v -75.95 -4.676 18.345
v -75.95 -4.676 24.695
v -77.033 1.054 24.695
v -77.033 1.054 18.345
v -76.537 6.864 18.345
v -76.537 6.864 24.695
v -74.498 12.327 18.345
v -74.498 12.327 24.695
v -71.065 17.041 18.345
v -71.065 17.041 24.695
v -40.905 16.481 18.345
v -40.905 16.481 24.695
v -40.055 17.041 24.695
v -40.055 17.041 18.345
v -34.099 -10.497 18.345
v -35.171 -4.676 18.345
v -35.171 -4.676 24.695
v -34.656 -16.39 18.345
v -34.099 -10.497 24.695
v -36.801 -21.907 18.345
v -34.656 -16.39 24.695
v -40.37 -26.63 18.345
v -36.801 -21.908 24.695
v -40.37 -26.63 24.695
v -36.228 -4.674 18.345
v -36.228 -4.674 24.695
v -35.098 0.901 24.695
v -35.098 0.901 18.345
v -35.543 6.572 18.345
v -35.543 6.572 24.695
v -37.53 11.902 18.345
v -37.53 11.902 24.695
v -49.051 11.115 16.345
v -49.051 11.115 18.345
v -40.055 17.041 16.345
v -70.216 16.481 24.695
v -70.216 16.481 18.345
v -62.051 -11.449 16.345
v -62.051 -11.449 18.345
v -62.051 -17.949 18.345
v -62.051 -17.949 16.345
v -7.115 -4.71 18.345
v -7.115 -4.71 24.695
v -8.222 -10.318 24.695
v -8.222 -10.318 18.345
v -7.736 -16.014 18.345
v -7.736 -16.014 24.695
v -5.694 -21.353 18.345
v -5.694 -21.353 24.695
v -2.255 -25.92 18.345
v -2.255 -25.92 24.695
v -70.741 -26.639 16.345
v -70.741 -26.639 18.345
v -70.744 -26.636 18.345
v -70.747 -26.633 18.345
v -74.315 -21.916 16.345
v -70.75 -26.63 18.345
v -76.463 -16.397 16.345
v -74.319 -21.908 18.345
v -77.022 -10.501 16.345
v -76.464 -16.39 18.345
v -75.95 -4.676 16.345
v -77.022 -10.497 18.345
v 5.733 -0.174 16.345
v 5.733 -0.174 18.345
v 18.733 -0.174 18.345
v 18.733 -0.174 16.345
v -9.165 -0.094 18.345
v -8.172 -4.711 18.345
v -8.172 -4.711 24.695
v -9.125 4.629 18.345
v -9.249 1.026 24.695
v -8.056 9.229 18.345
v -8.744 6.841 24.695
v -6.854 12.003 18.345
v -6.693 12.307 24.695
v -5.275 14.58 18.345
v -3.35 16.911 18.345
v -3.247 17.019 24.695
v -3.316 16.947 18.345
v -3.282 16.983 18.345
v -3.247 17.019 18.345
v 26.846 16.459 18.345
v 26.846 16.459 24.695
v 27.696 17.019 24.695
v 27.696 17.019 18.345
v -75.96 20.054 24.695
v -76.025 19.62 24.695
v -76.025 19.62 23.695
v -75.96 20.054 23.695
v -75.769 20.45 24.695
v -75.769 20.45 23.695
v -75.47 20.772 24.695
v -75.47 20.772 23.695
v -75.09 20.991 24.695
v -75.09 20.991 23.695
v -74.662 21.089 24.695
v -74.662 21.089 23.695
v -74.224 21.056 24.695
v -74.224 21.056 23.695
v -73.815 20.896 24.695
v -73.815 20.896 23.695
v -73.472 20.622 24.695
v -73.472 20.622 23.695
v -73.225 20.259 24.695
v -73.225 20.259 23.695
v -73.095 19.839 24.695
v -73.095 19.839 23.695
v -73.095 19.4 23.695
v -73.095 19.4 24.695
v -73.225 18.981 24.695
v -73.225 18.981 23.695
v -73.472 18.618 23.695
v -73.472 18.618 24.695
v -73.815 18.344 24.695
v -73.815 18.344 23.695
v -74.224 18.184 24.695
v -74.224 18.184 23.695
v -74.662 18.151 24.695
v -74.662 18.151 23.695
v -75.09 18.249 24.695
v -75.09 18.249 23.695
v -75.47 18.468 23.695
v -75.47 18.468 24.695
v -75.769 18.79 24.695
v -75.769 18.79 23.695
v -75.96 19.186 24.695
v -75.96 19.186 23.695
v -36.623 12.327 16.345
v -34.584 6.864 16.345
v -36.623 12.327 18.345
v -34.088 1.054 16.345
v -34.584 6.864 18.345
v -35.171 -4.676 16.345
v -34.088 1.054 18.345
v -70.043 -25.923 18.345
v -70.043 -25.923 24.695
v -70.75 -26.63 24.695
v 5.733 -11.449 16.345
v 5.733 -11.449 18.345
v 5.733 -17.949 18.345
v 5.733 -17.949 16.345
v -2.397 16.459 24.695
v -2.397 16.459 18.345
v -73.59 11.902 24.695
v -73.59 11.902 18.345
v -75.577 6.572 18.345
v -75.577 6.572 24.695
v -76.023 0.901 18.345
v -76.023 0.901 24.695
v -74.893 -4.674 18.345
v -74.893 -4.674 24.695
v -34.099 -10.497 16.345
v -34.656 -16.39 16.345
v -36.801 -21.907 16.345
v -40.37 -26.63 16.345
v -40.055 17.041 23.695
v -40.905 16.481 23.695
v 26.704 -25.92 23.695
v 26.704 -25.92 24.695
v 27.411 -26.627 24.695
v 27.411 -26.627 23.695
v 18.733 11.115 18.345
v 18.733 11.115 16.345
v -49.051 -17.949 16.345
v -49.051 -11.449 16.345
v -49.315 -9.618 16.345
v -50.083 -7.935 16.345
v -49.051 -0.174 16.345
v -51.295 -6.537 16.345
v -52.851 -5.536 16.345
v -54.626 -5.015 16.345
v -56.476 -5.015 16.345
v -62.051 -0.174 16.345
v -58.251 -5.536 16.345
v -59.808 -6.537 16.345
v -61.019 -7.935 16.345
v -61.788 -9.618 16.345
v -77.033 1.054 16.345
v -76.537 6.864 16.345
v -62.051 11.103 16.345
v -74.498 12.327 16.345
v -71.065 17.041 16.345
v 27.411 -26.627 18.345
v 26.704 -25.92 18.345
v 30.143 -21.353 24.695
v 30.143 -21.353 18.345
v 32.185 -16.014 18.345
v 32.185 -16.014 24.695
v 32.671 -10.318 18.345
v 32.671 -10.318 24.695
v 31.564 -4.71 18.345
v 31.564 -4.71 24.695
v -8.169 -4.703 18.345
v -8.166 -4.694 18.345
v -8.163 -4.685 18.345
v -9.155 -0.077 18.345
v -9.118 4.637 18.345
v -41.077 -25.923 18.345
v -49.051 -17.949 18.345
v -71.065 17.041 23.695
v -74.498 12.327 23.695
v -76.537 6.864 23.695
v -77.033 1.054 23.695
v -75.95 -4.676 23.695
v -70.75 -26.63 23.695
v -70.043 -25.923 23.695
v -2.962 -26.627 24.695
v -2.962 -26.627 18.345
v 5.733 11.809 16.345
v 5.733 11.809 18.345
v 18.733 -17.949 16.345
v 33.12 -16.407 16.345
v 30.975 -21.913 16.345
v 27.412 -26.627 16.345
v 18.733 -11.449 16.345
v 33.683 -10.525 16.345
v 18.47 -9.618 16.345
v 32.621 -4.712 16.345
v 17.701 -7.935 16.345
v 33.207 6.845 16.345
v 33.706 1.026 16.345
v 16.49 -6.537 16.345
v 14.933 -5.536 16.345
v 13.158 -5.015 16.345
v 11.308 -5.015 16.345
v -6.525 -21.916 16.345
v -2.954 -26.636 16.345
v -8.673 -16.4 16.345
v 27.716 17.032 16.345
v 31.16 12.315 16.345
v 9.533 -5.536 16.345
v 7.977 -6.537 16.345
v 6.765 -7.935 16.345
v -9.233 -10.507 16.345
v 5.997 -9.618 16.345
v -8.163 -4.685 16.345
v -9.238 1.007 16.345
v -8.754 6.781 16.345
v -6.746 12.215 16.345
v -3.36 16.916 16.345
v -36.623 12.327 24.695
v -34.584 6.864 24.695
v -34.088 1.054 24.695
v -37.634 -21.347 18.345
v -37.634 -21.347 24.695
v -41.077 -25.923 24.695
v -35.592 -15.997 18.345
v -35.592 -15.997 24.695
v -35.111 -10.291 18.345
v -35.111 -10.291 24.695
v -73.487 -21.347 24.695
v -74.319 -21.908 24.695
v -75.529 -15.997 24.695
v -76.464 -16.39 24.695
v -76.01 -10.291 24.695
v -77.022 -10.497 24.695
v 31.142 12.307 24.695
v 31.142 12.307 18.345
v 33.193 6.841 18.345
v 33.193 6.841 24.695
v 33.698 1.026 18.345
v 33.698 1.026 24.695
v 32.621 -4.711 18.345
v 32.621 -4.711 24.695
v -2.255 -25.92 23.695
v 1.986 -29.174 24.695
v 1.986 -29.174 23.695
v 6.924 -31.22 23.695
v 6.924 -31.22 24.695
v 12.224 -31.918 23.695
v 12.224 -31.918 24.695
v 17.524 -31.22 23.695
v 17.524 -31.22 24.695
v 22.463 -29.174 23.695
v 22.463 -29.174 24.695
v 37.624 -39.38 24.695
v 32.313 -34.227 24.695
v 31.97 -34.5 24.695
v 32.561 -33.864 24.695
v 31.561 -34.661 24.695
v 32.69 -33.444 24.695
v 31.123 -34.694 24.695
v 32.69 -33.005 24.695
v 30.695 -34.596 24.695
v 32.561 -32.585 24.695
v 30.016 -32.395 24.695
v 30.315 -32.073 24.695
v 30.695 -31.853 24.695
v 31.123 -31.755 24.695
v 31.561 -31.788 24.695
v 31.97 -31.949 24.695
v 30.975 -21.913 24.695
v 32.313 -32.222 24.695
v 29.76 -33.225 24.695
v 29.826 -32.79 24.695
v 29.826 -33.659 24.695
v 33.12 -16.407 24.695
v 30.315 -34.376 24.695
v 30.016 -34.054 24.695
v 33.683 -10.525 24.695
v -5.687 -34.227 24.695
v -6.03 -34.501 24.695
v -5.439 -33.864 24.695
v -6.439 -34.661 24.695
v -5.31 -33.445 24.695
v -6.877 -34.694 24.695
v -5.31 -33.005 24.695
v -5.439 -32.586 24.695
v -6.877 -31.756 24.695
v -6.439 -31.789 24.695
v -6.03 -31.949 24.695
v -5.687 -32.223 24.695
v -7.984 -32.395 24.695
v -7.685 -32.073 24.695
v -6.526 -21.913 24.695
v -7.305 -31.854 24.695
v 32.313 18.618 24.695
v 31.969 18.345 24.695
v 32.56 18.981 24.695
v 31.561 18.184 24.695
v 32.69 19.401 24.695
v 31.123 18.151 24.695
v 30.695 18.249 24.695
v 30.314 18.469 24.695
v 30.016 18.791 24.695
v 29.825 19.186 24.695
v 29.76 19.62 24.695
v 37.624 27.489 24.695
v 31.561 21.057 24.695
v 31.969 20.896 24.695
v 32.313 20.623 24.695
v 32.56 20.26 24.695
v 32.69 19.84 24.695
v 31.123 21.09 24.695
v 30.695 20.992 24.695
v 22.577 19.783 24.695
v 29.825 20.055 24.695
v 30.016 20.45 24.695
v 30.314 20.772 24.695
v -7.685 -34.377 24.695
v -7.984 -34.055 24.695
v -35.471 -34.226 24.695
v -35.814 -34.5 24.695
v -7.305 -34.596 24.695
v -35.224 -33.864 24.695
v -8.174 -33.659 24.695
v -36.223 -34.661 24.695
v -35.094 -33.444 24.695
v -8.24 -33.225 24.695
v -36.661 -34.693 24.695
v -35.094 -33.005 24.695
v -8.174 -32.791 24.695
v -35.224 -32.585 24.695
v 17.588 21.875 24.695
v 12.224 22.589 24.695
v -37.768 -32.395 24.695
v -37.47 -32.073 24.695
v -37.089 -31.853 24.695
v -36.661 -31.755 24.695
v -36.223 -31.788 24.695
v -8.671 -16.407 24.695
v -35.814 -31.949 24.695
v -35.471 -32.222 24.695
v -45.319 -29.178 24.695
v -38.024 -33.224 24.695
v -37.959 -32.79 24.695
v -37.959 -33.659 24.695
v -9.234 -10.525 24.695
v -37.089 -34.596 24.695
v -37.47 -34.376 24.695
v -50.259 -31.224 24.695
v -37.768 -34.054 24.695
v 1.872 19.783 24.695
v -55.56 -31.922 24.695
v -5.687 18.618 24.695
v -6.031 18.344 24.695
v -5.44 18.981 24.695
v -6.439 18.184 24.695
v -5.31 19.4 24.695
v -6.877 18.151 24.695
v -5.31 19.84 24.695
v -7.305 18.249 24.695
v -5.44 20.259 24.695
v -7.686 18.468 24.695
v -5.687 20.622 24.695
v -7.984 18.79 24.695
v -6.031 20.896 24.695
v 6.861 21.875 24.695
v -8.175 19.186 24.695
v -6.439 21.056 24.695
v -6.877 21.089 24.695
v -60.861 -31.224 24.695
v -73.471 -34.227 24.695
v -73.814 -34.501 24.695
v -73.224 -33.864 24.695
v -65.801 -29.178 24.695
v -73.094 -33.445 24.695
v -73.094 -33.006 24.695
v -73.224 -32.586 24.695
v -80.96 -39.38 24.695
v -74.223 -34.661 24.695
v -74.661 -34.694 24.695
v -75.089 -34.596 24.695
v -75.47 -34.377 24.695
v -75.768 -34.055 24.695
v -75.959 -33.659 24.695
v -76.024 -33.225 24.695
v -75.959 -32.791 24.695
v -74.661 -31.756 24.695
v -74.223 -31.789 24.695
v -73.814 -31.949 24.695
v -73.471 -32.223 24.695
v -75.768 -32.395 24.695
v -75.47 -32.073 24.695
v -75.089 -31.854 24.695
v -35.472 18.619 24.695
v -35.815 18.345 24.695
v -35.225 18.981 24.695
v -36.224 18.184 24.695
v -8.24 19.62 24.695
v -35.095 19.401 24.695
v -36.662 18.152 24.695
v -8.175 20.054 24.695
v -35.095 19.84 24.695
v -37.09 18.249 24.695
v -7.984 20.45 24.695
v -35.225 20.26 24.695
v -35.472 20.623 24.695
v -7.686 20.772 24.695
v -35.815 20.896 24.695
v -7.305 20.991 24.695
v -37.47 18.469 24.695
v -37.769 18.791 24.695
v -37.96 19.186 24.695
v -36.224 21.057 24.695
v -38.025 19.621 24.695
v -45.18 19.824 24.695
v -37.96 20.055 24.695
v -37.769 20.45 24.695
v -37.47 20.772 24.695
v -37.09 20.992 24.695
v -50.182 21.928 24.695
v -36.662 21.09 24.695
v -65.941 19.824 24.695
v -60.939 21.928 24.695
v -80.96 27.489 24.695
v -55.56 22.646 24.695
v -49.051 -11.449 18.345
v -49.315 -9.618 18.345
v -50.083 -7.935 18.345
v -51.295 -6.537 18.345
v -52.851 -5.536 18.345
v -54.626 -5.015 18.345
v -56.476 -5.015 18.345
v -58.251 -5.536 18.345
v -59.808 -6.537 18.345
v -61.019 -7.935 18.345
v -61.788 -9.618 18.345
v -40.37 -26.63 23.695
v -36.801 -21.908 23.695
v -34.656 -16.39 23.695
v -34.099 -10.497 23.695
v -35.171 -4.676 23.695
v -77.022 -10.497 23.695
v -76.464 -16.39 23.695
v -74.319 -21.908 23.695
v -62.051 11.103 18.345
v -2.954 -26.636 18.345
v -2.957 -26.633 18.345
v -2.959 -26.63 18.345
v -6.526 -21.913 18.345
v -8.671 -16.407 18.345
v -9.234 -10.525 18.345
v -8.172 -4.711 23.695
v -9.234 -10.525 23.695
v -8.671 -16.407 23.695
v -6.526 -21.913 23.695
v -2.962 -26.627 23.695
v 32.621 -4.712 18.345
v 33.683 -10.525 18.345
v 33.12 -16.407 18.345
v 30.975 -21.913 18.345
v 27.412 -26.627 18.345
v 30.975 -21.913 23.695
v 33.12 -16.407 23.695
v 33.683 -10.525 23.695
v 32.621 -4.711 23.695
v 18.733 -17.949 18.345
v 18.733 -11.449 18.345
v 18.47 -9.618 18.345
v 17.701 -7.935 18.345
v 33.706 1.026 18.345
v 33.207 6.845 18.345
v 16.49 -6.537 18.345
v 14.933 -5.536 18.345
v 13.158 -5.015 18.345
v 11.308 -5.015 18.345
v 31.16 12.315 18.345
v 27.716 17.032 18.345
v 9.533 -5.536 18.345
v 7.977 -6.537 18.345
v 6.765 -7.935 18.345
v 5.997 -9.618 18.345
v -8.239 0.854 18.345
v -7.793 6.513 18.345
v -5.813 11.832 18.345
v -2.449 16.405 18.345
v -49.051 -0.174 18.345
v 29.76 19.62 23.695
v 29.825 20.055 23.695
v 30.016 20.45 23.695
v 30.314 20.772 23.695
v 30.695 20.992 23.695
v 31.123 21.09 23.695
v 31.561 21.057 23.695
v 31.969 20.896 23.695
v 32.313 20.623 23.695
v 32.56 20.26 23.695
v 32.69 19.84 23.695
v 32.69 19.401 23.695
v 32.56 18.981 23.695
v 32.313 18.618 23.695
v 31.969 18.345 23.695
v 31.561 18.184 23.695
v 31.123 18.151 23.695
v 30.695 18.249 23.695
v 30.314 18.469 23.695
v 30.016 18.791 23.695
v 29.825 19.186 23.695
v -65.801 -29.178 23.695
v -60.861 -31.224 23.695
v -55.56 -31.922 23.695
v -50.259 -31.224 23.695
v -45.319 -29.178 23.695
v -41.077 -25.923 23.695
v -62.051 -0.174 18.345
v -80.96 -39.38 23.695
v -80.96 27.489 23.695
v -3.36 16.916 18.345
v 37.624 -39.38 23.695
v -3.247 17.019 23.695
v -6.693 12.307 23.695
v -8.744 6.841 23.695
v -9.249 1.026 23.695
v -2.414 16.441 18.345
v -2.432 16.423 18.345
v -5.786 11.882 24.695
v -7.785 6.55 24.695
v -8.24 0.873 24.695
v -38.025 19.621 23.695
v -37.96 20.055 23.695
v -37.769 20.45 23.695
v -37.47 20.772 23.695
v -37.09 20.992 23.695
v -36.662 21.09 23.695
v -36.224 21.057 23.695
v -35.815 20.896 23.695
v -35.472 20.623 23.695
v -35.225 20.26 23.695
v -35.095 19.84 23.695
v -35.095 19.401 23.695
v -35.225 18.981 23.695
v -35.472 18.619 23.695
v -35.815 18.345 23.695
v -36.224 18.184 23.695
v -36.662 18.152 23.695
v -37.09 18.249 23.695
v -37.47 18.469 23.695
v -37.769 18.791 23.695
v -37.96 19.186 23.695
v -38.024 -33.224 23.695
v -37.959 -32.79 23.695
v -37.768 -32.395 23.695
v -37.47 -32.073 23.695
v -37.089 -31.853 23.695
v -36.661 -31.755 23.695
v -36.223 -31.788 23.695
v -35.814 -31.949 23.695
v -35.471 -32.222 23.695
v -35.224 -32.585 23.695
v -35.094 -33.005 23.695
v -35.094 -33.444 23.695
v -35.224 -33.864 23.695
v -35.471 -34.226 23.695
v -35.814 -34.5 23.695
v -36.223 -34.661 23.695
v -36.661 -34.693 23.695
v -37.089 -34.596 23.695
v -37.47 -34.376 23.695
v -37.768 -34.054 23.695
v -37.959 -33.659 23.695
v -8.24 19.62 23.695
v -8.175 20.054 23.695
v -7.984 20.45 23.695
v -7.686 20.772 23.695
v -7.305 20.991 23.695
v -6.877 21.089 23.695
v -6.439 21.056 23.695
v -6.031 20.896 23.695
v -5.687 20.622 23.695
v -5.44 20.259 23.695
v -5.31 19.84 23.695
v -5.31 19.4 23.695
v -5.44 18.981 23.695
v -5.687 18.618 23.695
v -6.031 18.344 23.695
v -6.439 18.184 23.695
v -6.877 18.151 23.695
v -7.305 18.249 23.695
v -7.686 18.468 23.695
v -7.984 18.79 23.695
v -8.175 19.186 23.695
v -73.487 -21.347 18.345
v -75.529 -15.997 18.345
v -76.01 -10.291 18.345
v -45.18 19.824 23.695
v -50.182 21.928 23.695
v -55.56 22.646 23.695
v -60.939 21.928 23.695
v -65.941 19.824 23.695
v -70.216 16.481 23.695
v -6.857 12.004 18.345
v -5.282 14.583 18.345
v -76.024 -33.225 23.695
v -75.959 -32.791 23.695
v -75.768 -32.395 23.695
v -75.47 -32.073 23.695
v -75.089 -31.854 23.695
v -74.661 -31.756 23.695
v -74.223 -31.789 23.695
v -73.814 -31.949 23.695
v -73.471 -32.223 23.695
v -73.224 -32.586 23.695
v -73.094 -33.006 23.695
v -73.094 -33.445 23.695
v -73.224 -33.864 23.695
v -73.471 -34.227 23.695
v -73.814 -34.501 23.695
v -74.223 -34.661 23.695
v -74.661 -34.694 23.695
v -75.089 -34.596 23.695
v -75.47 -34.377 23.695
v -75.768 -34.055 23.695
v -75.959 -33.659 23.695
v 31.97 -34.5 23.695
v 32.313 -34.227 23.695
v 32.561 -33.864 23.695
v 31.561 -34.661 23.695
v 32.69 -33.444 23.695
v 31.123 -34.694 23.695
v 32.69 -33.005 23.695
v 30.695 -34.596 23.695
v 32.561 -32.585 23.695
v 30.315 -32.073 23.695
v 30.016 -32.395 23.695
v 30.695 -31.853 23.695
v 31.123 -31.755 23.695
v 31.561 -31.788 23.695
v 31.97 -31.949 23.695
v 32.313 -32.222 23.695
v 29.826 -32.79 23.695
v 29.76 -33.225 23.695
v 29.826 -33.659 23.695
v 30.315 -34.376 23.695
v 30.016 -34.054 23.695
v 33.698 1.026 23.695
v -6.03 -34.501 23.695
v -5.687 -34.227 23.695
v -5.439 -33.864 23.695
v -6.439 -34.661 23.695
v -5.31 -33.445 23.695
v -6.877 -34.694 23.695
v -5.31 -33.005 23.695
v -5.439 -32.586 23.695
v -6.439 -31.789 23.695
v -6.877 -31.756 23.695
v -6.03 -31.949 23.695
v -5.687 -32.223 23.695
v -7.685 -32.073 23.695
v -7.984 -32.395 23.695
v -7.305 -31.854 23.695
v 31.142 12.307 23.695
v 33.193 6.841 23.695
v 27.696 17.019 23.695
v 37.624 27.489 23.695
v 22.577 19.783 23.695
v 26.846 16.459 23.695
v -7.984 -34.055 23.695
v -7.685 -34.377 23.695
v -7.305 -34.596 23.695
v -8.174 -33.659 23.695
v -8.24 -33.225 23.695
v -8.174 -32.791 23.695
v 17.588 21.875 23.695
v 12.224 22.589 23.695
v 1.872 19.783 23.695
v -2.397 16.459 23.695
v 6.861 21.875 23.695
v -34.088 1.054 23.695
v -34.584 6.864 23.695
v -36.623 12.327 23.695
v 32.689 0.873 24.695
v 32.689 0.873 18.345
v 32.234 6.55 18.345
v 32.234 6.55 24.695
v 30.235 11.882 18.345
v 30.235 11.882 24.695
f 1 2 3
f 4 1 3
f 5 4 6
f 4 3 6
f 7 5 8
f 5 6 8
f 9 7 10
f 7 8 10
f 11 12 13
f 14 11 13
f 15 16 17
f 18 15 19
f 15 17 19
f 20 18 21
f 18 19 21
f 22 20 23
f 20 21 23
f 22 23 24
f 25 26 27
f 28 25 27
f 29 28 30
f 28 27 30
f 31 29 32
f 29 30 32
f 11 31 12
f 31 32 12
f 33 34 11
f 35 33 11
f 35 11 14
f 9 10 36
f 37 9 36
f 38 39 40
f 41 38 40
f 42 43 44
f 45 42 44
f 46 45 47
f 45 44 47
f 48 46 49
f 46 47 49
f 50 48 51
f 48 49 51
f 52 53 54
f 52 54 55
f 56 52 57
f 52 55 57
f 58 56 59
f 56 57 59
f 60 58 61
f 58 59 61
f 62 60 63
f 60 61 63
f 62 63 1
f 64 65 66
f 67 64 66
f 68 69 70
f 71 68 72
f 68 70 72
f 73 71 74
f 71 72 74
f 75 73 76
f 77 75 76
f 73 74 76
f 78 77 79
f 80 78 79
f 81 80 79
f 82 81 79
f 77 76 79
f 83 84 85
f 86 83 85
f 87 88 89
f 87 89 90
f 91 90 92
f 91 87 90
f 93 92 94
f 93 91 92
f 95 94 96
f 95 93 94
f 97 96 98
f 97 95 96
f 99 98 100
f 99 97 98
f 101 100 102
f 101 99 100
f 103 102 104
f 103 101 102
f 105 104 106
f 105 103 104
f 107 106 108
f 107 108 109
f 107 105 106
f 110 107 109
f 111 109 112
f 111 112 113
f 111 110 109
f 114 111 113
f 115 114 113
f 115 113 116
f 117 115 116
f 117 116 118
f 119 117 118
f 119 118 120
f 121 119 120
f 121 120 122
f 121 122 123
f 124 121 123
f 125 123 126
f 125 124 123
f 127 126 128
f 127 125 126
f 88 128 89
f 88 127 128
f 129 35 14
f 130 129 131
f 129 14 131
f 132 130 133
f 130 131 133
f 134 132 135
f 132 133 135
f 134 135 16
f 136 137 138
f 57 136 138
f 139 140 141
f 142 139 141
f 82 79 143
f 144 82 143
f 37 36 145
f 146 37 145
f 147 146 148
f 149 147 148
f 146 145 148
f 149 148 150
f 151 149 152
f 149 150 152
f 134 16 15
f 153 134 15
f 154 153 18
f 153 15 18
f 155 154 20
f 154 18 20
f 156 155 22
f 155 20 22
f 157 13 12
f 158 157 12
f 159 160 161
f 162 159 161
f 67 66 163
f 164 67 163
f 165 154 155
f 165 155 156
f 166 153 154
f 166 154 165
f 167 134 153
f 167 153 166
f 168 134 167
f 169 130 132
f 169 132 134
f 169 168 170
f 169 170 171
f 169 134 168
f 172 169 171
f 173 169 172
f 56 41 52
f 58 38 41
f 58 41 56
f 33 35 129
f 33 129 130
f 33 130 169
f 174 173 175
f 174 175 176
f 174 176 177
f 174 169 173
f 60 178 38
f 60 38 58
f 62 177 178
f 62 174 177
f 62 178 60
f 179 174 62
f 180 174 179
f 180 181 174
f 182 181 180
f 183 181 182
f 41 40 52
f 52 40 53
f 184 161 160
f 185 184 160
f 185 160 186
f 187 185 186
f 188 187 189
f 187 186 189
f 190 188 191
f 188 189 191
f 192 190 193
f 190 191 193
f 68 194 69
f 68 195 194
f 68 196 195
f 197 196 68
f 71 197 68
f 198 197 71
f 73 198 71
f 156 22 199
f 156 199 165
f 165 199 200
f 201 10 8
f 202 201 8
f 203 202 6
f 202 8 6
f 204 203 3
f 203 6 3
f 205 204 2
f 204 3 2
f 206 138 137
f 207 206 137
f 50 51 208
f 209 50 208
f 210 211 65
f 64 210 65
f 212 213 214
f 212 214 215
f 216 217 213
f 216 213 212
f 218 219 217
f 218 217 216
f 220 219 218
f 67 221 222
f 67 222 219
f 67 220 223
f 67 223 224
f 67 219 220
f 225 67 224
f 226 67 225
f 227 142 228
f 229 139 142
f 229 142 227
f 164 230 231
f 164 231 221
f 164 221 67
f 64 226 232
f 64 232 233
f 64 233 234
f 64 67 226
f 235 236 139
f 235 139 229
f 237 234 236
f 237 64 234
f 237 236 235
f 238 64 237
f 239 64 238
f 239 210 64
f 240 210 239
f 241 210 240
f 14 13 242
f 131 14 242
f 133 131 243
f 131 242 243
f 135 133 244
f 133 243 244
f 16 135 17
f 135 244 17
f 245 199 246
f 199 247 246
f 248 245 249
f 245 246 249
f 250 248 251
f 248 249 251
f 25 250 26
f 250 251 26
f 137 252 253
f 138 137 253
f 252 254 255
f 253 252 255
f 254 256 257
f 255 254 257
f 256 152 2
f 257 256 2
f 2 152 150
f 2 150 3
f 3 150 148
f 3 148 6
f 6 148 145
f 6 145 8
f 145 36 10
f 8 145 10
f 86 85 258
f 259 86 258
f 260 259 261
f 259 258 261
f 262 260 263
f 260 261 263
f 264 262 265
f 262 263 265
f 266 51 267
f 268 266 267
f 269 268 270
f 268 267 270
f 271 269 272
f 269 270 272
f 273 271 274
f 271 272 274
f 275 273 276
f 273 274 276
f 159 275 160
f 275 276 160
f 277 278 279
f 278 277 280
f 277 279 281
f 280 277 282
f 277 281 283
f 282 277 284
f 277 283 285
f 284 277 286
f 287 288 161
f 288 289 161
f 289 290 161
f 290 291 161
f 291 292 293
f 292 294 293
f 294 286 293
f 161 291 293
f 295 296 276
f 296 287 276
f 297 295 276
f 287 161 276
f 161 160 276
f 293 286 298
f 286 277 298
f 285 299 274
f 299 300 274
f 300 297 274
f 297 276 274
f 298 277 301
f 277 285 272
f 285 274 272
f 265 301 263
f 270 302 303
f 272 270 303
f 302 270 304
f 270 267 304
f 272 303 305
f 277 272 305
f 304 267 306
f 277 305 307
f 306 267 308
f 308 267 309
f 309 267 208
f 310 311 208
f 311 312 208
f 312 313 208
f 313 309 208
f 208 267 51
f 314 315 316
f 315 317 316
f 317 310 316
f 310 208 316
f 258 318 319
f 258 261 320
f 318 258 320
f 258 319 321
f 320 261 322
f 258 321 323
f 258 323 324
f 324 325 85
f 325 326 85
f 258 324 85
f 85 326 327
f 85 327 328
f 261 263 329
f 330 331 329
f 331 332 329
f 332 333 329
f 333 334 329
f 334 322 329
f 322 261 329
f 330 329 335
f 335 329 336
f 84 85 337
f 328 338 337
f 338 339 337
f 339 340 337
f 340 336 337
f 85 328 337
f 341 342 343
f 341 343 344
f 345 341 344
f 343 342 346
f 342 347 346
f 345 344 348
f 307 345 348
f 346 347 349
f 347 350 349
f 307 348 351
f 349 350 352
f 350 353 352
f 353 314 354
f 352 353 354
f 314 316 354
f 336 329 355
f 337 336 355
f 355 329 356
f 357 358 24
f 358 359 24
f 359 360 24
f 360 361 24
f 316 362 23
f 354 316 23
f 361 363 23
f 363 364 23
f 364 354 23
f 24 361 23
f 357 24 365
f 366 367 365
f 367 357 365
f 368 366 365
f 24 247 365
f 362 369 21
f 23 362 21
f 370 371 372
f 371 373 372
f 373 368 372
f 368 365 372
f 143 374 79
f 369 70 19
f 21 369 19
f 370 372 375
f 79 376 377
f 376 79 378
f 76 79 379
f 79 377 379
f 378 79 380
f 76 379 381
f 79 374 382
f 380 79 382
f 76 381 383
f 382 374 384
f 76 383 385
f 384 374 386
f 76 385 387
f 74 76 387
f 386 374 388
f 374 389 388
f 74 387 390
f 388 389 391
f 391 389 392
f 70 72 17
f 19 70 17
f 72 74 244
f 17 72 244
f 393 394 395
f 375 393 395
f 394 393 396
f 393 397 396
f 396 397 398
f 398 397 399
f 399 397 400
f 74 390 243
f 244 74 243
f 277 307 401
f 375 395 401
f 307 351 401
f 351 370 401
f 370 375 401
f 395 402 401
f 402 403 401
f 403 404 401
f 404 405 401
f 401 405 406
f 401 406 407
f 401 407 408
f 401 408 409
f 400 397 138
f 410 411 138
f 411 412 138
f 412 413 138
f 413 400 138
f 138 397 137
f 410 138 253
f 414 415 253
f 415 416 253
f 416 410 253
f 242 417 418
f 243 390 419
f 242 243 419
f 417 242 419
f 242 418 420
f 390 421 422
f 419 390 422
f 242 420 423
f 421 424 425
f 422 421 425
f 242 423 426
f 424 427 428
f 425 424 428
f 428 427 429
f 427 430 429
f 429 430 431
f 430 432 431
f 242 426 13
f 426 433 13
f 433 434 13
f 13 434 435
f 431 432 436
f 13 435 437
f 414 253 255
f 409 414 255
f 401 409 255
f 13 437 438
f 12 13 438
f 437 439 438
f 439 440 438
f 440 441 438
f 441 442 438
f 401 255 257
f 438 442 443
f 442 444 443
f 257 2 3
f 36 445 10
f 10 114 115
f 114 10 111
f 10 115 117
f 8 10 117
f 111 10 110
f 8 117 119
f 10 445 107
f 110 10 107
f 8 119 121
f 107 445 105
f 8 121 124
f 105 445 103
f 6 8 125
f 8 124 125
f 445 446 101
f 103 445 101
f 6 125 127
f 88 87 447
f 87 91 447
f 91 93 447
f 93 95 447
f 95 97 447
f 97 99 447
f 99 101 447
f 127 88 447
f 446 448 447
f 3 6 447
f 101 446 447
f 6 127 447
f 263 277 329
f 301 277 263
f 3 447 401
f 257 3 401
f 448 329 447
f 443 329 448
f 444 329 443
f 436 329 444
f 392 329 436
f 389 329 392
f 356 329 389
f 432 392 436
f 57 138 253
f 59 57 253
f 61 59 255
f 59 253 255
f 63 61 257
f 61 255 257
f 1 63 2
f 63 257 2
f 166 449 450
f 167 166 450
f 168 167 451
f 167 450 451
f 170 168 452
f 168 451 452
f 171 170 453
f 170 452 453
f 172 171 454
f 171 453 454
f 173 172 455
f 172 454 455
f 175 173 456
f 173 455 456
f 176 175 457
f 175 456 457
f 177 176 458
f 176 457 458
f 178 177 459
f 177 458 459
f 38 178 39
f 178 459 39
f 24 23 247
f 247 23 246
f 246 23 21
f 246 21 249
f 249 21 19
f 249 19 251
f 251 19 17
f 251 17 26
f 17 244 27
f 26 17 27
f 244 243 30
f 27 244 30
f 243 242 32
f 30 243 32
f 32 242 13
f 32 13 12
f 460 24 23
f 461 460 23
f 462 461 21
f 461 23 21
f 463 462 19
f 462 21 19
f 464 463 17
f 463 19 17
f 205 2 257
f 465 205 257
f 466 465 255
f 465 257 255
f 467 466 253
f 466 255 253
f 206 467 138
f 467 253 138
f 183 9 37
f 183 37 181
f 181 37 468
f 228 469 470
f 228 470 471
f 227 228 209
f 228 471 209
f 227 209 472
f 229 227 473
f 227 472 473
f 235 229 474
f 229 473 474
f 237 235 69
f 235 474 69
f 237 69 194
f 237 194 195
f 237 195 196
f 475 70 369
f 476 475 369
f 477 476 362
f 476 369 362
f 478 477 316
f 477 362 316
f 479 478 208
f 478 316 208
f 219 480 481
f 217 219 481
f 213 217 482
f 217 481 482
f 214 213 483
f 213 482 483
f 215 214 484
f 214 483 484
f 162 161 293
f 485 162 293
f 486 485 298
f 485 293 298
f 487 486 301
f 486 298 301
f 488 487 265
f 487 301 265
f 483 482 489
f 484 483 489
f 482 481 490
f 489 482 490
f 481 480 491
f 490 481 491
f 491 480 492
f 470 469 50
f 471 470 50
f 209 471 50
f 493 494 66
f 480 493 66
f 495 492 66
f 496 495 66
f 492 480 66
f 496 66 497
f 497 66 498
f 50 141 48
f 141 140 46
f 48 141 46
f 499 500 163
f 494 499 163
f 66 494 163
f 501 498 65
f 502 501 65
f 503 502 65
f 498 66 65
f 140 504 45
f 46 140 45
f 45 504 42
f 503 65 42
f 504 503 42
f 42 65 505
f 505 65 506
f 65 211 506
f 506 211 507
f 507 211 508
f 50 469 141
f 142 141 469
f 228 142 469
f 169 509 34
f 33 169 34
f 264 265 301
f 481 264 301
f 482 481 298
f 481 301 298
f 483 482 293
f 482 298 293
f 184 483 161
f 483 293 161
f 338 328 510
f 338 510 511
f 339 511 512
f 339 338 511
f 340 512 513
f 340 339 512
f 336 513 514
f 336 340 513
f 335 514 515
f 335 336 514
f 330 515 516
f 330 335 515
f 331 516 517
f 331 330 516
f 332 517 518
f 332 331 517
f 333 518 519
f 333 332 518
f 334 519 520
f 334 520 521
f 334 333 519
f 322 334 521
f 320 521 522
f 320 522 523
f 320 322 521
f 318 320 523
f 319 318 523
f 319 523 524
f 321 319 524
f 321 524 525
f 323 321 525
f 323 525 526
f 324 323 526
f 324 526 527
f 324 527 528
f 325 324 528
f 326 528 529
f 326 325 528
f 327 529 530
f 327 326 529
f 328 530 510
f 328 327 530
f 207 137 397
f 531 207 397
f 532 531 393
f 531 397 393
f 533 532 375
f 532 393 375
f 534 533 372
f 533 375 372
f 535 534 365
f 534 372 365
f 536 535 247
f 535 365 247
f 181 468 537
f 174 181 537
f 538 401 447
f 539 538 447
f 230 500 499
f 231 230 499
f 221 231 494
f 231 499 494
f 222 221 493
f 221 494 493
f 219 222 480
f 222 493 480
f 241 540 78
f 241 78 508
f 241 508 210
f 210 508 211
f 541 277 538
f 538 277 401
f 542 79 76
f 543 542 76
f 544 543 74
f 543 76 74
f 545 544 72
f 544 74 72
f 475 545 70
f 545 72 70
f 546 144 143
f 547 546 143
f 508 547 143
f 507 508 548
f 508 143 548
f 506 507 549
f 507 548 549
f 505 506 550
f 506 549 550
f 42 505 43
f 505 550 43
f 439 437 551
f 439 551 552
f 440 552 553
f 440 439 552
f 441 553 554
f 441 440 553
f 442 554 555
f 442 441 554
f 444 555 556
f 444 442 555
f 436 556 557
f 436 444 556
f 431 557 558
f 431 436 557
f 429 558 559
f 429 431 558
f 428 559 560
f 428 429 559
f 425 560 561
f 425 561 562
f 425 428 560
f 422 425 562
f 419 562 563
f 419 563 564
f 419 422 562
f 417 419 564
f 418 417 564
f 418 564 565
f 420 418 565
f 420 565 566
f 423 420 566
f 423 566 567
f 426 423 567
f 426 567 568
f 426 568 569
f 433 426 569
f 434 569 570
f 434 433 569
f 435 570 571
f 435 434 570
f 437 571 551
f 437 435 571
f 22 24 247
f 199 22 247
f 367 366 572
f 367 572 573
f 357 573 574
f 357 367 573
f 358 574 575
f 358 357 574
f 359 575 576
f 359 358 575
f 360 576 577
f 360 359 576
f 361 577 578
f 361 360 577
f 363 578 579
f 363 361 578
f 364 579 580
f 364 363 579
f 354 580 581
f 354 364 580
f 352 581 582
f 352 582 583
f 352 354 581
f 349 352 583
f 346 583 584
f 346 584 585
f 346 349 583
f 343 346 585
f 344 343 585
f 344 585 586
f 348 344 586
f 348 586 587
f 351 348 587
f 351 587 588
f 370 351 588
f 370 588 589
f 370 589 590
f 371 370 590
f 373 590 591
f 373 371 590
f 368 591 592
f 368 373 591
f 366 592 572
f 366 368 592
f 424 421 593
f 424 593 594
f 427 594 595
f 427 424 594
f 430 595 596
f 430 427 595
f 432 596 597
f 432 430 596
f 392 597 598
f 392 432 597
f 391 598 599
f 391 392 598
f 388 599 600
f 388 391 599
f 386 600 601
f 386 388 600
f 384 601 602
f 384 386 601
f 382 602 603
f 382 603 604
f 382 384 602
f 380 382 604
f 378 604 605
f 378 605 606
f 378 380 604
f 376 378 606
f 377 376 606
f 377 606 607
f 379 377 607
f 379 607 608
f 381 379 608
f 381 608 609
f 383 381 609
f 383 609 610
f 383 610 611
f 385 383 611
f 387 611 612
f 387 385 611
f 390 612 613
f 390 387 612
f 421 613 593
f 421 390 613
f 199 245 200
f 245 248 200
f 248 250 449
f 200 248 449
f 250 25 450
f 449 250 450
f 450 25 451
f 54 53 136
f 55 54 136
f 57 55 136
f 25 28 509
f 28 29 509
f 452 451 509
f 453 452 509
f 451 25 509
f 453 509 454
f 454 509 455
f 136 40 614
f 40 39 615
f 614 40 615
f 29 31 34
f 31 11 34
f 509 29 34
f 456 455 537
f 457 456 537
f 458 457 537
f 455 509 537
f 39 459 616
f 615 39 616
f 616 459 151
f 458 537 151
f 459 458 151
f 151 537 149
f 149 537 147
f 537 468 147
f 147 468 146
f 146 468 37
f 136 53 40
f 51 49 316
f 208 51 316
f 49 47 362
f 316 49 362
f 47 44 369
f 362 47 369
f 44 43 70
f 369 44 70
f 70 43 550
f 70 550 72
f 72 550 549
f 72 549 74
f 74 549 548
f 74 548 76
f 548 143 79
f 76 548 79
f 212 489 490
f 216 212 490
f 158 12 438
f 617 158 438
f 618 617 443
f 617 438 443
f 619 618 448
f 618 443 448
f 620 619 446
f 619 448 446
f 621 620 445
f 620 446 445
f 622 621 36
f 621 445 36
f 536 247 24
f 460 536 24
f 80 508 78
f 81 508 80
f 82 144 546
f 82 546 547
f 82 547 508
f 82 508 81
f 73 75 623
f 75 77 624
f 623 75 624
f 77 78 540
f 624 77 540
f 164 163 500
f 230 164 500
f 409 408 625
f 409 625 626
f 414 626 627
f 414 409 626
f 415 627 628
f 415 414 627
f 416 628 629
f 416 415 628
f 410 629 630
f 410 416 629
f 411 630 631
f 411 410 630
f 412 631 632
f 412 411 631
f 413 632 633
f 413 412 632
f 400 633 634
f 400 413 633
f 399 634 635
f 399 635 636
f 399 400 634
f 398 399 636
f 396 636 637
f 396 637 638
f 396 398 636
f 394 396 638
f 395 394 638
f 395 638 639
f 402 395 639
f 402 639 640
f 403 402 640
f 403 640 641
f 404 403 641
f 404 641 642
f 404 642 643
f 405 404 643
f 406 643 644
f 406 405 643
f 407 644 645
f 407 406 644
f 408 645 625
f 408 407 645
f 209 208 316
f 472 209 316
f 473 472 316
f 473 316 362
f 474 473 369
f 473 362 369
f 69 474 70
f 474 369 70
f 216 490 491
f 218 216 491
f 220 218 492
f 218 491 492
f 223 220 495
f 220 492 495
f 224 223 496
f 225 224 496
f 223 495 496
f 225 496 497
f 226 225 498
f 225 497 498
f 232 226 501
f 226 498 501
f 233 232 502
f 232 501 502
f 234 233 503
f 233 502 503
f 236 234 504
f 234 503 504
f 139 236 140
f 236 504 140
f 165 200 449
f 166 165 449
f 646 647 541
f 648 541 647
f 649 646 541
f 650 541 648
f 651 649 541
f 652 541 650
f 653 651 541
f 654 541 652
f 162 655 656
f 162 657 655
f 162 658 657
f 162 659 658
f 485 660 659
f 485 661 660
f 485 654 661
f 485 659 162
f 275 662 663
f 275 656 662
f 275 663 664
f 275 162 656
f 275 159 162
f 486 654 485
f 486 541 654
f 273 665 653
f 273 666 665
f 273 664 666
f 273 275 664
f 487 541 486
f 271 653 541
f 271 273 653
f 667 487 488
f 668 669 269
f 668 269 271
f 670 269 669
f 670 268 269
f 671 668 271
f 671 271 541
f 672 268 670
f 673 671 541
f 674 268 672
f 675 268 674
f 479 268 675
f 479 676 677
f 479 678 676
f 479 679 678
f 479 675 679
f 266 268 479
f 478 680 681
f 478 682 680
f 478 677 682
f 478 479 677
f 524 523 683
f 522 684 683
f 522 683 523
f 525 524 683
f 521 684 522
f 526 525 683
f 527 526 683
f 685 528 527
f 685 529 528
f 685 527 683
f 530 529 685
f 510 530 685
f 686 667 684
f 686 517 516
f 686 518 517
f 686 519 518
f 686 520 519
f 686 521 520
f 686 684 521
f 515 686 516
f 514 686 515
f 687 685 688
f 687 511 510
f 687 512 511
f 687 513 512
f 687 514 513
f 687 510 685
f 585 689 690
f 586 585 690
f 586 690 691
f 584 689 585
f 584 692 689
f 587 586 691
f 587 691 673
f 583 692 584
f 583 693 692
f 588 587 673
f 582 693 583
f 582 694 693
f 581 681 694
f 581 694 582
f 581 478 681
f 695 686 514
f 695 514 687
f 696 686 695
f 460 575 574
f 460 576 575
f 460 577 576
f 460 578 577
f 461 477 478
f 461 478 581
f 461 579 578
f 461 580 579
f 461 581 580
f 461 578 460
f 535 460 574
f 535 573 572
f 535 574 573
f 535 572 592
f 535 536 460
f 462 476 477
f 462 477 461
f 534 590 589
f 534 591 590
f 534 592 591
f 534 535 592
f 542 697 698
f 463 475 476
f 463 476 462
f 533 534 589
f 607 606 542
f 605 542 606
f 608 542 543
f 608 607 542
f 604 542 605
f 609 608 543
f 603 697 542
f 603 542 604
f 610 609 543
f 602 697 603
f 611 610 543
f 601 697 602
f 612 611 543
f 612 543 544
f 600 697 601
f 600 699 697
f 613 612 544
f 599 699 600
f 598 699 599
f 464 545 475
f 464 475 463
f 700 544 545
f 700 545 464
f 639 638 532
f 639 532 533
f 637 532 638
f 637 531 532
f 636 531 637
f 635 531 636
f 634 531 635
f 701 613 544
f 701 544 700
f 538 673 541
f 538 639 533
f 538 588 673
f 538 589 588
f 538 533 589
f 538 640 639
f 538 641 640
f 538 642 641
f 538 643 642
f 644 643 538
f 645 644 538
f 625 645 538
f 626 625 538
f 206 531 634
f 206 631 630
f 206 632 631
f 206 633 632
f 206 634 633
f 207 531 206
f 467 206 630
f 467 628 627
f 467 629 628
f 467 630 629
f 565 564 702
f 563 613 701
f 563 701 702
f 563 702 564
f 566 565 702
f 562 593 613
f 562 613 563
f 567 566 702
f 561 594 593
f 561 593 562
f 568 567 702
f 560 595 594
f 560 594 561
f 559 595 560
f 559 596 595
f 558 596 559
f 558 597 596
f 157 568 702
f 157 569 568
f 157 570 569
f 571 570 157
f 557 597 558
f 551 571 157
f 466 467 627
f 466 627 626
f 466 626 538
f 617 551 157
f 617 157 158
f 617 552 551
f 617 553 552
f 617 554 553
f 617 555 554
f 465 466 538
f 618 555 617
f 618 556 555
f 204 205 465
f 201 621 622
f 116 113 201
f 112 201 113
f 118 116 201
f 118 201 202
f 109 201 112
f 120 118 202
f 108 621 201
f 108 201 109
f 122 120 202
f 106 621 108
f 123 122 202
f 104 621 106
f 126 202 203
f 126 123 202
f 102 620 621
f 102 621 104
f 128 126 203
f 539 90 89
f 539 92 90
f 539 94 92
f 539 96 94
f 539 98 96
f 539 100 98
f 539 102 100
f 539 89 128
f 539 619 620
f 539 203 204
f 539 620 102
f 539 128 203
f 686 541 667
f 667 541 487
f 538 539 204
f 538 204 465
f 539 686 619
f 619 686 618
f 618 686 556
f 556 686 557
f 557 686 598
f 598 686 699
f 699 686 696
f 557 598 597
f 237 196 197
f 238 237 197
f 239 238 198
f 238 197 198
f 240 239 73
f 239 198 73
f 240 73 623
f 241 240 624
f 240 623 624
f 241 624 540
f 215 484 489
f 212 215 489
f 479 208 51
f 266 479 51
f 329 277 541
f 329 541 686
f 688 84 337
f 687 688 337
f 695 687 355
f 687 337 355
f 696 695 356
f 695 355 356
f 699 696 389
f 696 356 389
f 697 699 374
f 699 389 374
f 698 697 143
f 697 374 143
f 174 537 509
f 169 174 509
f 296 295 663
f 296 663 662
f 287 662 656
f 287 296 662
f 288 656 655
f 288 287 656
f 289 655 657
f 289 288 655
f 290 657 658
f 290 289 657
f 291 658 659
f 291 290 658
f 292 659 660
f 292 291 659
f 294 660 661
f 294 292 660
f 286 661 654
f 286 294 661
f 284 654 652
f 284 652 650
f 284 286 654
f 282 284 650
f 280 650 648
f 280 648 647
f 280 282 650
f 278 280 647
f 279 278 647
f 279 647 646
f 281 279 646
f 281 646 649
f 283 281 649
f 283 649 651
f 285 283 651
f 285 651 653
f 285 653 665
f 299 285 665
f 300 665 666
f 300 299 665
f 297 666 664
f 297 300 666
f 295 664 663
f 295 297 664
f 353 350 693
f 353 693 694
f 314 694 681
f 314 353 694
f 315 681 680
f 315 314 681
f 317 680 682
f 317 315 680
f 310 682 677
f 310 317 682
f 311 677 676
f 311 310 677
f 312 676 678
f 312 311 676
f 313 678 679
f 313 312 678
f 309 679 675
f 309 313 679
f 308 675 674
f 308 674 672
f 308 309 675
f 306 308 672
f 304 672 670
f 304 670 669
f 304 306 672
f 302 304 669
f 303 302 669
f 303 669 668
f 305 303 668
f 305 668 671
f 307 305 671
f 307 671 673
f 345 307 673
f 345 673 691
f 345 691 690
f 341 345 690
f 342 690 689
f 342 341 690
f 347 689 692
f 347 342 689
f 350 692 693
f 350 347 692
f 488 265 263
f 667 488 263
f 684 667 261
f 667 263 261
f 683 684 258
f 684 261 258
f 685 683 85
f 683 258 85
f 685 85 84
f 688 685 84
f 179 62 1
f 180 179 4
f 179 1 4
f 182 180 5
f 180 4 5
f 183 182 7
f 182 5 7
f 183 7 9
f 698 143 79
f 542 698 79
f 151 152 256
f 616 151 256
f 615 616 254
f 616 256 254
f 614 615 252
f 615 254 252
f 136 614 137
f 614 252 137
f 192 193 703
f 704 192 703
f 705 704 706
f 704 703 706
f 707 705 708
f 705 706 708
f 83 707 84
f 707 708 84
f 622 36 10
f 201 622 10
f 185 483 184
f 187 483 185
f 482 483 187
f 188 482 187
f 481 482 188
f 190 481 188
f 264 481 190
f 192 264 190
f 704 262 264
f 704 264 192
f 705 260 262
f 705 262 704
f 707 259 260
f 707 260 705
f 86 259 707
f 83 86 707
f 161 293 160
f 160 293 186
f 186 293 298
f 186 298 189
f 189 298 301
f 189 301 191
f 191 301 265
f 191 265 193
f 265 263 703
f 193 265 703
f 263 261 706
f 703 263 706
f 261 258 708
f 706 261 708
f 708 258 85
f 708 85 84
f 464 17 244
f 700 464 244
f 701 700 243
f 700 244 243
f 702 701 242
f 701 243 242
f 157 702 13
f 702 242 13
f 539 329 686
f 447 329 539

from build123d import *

# Parameters (mm, degrees)
BOSS_EXTRUDE1_DEPTH   = 6.35
BOSS_EXTRUDE1_2_DEPTH = 6.35
BOSS_EXTRUDE1_3_DEPTH = 6.35
BOSS_EXTRUDE1_4_DEPTH = 6.35
SKETCH1_5_W           = 118.584765391
SKETCH1_5_H           = 66.869276247
SKETCH1_5_R           = 1.4732
BOSS_EXTRUDE7_DEPTH   = 1
BOSS_EXTRUDE8_DEPTH   = 2


with BuildPart() as part:
    # Sketch1 → Boss-Extrude1 (new body)
    with BuildSketch(Plane(origin=(0, 0, 24.694917193), x_dir=(-1, 0, 0), z_dir=(0, 0, -1))):
        with BuildLine():
            Line((-27.411403448, -26.627000625), (-26.704296667, -25.919893844))
            ThreePointArc((-26.704296667, -25.919893844), (-32.184721764, -16.013806308), (-31.564428782, -4.709786398))
            ThreePointArc((-31.564428782, -4.709786398), (-32.233619939, 6.549502204), (-26.845726601, 16.458589045))
            Line((-26.845726601, 16.458589045), (-27.696075992, 17.018714539))
            ThreePointArc((-27.696075992, 17.018714539), (-33.192970324, 6.841344605), (-32.620835017, -4.711463161))
            ThreePointArc((-32.620835017, -4.711463161), (-33.119816188, -16.406995999), (-27.411403448, -26.627000625))
        make_face()
    extrude(amount=BOSS_EXTRUDE1_DEPTH)


with BuildPart() as body_2:
    # Sketch1 → Boss-Extrude1 2 (new body)
    with BuildSketch(Plane(origin=(0, 0, 24.694917193), x_dir=(-1, 0, 0), z_dir=(0, 0, -1))):
        with BuildLine():
            ThreePointArc((7.115484162, -4.709786398), (7.735777145, -16.013806308), (2.255352047, -25.919893844))
            Line((2.255352047, -25.919893844), (2.962458828, -26.627000625))
            ThreePointArc((2.962458828, -26.627000625), (8.670871569, -16.406995999), (8.171890397, -4.711463161))
            ThreePointArc((8.171890397, -4.711463161), (8.744025704, 6.841344604), (3.247131374, 17.018714539))
            Line((3.247131374, 17.018714539), (2.396781982, 16.458589044))
            ThreePointArc((2.396781982, 16.458589044), (7.78467532, 6.549502204), (7.115484162, -4.709786398))
        make_face()
    extrude(amount=BOSS_EXTRUDE1_2_DEPTH)


with BuildPart() as body_3:
    # Sketch1 → Boss-Extrude1 3 (new body)
    with BuildSketch(Plane(origin=(0, 0, 24.694917193), x_dir=(-1, 0, 0), z_dir=(0, 0, -1))):
        with BuildLine():
            Line((40.905080795, 16.480957305), (40.055105354, 17.040836478))
            ThreePointArc((40.055105354, 17.040836478), (34.583953243, 6.863754684), (35.170996775, -4.675824129))
            ThreePointArc((35.170996775, -4.675824129), (34.656423866, -16.390490779), (40.370190726, -26.630171843))
            Line((40.370190726, -26.630171843), (41.077297507, -25.923065062))
            ThreePointArc((41.077297507, -25.923065062), (35.59167816, -15.997342767), (36.227907399, -4.674481156))
            ThreePointArc((36.227907399, -4.674481156), (35.543366543, 6.571609557), (40.905080795, 16.480957305))
        make_face()
    extrude(amount=BOSS_EXTRUDE1_3_DEPTH)


with BuildPart() as body_4:
    # Sketch1 → Boss-Extrude1 4 (new body)
    with BuildSketch(Plane(origin=(0, 0, 24.694917193), x_dir=(-1, 0, 0), z_dir=(0, 0, -1))):
        with BuildLine():
            Line((71.065480809, 17.040836478), (70.215505368, 16.480957305))
            ThreePointArc((70.215505368, 16.480957305), (75.57721962, 6.571609557), (74.892678764, -4.674481156))
            ThreePointArc((74.892678764, -4.674481156), (75.528908003, -15.997342767), (70.043288656, -25.923065062))
            Line((70.043288656, -25.923065062), (70.750395437, -26.630171843))
            ThreePointArc((70.750395437, -26.630171843), (76.464162297, -16.390490779), (75.949589388, -4.675824129))
            ThreePointArc((75.949589388, -4.675824129), (76.536632919, 6.863754684), (71.065480809, 17.040836478))
        make_face()
    extrude(amount=BOSS_EXTRUDE1_4_DEPTH)


    add(body_3.part)  # Boss-Extrude8 merges body 3

    add(body_2.part)  # Boss-Extrude8 merges body 2
    # Sketch4 → Boss-Extrude8 (add)
    with BuildSketch(Plane(origin=(0, 0, 18.344917193), x_dir=(-1, 0, 0), z_dir=(0, 0, -1))):
        with BuildLine():
            ThreePointArc((35.170996775, -4.675824129), (34.656359811, -16.39022029), (40.369797621, -26.629778728))
            Line((40.369797621, -26.629778728), (49.051264407, -17.948639189))
            Line((49.051264407, -17.948639189), (49.051264407, -11.448944696))
            ThreePointArc((49.051264407, -11.448944696), (55.551264423, -4.948944679), (62.05126444, -11.448944696))
            Line((62.05126444, -11.448944696), (62.05126444, -17.948882965))
            Line((62.05126444, -17.948882965), (70.741309119, -26.639252729))
            ThreePointArc((70.741309119, -26.639252729), (76.4626812, -16.39674076), (75.949589388, -4.675824129))
            ThreePointArc((75.949589388, -4.675824129), (76.536632919, 6.863754684), (71.065480809, 17.040836478))
            Line((71.065480809, 17.040836478), (62.05126444, 11.103168443))
            Line((62.05126444, 11.103168443), (62.05126444, -0.173638647))
            Line((62.05126444, -0.173638647), (49.051264407, -0.173638647))
            Line((49.051264407, -0.173638647), (49.051264407, 11.115062804))
            Line((49.051264407, 11.115062804), (40.055105354, 17.040836478))
            ThreePointArc((40.055105354, 17.040836478), (34.583953243, 6.863754684), (35.170996775, -4.675824129))
        make_face()
        with BuildLine():
            Line((-18.733020444, -0.17367699), (-18.733020444, 11.114746157))
            Line((-18.733020444, 11.114746157), (-27.716340173, 17.032062564))
            ThreePointArc((-27.716340173, 17.032062564), (-33.206637308, 6.845224023), (-32.621050686, -4.712116951))
            ThreePointArc((-32.621050686, -4.712116951), (-33.119768742, -16.407195595), (-27.411600112, -26.626803958))
            Line((-27.411600112, -26.626803958), (-18.733248921, -17.948677527))
            Line((-18.733248921, -17.948677527), (-18.733248921, -11.448944686))
            ThreePointArc((-18.733248921, -11.448944686), (-12.233248904, -4.948944669), (-5.733248887, -11.448944686))
            Line((-5.733248887, -11.448944686), (-5.733248887, -17.948844627))
            Line((-5.733248887, -17.948844627), (2.953569125, -26.635885128))
            ThreePointArc((2.953569125, -26.635885128), (8.672580304, -16.399802024), (8.163303461, -4.685489272))
            ThreePointArc((8.163303461, -4.685489272), (8.754411469, 6.780844689), (3.360296242, 16.916412955))
            Line((3.360296242, 16.916412955), (-5.73302041, 11.808782641))
            Line((-5.73302041, 11.808782641), (-5.73302041, -0.17384409))
            Line((-5.73302041, -0.17384409), (-18.733020444, -0.17367699))
        make_face()
    extrude(amount=BOSS_EXTRUDE8_DEPTH)


with BuildPart() as body_5:
    # Sketch1<5> → Boss-Extrude7 (new body)
    with BuildSketch(Plane(origin=(0, 0, 24.694917193), x_dir=(-1, 0, 0), z_dir=(0, 0, -1))):
        with Locations((21.667910386, -5.945431363)):
            Rectangle(SKETCH1_5_W, SKETCH1_5_H)
        with Locations((-31.233446035, -33.224517796)):
            Circle(SKETCH1_5_R, mode=Mode.SUBTRACT)
        with Locations((6.766553887, -33.225006242)):
            Circle(SKETCH1_5_R, mode=Mode.SUBTRACT)
        with Locations((36.550977194, -33.224405729)):
            Circle(SKETCH1_5_R, mode=Mode.SUBTRACT)
        with Locations((74.550977113, -33.225118305)):
            Circle(SKETCH1_5_R, mode=Mode.SUBTRACT)
        with BuildLine():
            ThreePointArc((2.255352047, -25.919893844), (-12.22447231, -31.917633473), (-26.704296667, -25.919893844))
            Line((-26.704296667, -25.919893844), (-27.411403448, -26.627000625))
            ThreePointArc((-27.411403448, -26.627000625), (-33.119816188, -16.406995999), (-32.620835017, -4.711463161))
            ThreePointArc((-32.620835017, -4.711463161), (-33.192970324, 6.841344605), (-27.696075992, 17.018714539))
            Line((-27.696075992, 17.018714539), (-26.845726601, 16.458589045))
            ThreePointArc((-26.845726601, 16.458589045), (-12.224472309, 22.589456132), (2.396781982, 16.458589044))
            Line((2.396781982, 16.458589044), (3.247131374, 17.018714539))
            ThreePointArc((3.247131374, 17.018714539), (8.744025704, 6.841344604), (8.171890397, -4.711463161))
            ThreePointArc((8.171890397, -4.711463161), (8.670871569, -16.406995999), (2.962458828, -26.627000625))
            Line((2.962458828, -26.627000625), (2.255352047, -25.919893844))
        make_face(mode=Mode.SUBTRACT)
        with Locations((-31.232766774, 19.620482705)):
            Circle(SKETCH1_5_R, mode=Mode.SUBTRACT)
        with Locations((6.767233148, 19.619994259)):
            Circle(SKETCH1_5_R, mode=Mode.SUBTRACT)
        with BuildLine():
            ThreePointArc((35.170996775, -4.675824129), (34.583953243, 6.863754684), (40.055105354, 17.040836478))
            Line((40.055105354, 17.040836478), (40.905080795, 16.480957305))
            ThreePointArc((40.905080795, 16.480957305), (55.560293081, 22.646439997), (70.215505368, 16.480957305))
            Line((70.215505368, 16.480957305), (71.065480809, 17.040836478))
            ThreePointArc((71.065480809, 17.040836478), (76.536632919, 6.863754684), (75.949589388, -4.675824129))
            ThreePointArc((75.949589388, -4.675824129), (76.464162297, -16.390490779), (70.750395437, -26.630171843))
            Line((70.750395437, -26.630171843), (70.043288656, -25.923065062))
            ThreePointArc((70.043288656, -25.923065062), (55.560293081, -31.922118252), (41.077297507, -25.923065062))
            Line((41.077297507, -25.923065062), (40.370190726, -26.630171843))
            ThreePointArc((40.370190726, -26.630171843), (34.656423866, -16.390490779), (35.170996775, -4.675824129))
        make_face(mode=Mode.SUBTRACT)
        with Locations((36.551968143, 19.620594767)):
            Circle(SKETCH1_5_R, mode=Mode.SUBTRACT)
        with Locations((74.551968061, 19.619882191)):
            Circle(SKETCH1_5_R, mode=Mode.SUBTRACT)
    extrude(amount=BOSS_EXTRUDE7_DEPTH)


solid = Compound([part.part, body_4.part, body_5.part])
